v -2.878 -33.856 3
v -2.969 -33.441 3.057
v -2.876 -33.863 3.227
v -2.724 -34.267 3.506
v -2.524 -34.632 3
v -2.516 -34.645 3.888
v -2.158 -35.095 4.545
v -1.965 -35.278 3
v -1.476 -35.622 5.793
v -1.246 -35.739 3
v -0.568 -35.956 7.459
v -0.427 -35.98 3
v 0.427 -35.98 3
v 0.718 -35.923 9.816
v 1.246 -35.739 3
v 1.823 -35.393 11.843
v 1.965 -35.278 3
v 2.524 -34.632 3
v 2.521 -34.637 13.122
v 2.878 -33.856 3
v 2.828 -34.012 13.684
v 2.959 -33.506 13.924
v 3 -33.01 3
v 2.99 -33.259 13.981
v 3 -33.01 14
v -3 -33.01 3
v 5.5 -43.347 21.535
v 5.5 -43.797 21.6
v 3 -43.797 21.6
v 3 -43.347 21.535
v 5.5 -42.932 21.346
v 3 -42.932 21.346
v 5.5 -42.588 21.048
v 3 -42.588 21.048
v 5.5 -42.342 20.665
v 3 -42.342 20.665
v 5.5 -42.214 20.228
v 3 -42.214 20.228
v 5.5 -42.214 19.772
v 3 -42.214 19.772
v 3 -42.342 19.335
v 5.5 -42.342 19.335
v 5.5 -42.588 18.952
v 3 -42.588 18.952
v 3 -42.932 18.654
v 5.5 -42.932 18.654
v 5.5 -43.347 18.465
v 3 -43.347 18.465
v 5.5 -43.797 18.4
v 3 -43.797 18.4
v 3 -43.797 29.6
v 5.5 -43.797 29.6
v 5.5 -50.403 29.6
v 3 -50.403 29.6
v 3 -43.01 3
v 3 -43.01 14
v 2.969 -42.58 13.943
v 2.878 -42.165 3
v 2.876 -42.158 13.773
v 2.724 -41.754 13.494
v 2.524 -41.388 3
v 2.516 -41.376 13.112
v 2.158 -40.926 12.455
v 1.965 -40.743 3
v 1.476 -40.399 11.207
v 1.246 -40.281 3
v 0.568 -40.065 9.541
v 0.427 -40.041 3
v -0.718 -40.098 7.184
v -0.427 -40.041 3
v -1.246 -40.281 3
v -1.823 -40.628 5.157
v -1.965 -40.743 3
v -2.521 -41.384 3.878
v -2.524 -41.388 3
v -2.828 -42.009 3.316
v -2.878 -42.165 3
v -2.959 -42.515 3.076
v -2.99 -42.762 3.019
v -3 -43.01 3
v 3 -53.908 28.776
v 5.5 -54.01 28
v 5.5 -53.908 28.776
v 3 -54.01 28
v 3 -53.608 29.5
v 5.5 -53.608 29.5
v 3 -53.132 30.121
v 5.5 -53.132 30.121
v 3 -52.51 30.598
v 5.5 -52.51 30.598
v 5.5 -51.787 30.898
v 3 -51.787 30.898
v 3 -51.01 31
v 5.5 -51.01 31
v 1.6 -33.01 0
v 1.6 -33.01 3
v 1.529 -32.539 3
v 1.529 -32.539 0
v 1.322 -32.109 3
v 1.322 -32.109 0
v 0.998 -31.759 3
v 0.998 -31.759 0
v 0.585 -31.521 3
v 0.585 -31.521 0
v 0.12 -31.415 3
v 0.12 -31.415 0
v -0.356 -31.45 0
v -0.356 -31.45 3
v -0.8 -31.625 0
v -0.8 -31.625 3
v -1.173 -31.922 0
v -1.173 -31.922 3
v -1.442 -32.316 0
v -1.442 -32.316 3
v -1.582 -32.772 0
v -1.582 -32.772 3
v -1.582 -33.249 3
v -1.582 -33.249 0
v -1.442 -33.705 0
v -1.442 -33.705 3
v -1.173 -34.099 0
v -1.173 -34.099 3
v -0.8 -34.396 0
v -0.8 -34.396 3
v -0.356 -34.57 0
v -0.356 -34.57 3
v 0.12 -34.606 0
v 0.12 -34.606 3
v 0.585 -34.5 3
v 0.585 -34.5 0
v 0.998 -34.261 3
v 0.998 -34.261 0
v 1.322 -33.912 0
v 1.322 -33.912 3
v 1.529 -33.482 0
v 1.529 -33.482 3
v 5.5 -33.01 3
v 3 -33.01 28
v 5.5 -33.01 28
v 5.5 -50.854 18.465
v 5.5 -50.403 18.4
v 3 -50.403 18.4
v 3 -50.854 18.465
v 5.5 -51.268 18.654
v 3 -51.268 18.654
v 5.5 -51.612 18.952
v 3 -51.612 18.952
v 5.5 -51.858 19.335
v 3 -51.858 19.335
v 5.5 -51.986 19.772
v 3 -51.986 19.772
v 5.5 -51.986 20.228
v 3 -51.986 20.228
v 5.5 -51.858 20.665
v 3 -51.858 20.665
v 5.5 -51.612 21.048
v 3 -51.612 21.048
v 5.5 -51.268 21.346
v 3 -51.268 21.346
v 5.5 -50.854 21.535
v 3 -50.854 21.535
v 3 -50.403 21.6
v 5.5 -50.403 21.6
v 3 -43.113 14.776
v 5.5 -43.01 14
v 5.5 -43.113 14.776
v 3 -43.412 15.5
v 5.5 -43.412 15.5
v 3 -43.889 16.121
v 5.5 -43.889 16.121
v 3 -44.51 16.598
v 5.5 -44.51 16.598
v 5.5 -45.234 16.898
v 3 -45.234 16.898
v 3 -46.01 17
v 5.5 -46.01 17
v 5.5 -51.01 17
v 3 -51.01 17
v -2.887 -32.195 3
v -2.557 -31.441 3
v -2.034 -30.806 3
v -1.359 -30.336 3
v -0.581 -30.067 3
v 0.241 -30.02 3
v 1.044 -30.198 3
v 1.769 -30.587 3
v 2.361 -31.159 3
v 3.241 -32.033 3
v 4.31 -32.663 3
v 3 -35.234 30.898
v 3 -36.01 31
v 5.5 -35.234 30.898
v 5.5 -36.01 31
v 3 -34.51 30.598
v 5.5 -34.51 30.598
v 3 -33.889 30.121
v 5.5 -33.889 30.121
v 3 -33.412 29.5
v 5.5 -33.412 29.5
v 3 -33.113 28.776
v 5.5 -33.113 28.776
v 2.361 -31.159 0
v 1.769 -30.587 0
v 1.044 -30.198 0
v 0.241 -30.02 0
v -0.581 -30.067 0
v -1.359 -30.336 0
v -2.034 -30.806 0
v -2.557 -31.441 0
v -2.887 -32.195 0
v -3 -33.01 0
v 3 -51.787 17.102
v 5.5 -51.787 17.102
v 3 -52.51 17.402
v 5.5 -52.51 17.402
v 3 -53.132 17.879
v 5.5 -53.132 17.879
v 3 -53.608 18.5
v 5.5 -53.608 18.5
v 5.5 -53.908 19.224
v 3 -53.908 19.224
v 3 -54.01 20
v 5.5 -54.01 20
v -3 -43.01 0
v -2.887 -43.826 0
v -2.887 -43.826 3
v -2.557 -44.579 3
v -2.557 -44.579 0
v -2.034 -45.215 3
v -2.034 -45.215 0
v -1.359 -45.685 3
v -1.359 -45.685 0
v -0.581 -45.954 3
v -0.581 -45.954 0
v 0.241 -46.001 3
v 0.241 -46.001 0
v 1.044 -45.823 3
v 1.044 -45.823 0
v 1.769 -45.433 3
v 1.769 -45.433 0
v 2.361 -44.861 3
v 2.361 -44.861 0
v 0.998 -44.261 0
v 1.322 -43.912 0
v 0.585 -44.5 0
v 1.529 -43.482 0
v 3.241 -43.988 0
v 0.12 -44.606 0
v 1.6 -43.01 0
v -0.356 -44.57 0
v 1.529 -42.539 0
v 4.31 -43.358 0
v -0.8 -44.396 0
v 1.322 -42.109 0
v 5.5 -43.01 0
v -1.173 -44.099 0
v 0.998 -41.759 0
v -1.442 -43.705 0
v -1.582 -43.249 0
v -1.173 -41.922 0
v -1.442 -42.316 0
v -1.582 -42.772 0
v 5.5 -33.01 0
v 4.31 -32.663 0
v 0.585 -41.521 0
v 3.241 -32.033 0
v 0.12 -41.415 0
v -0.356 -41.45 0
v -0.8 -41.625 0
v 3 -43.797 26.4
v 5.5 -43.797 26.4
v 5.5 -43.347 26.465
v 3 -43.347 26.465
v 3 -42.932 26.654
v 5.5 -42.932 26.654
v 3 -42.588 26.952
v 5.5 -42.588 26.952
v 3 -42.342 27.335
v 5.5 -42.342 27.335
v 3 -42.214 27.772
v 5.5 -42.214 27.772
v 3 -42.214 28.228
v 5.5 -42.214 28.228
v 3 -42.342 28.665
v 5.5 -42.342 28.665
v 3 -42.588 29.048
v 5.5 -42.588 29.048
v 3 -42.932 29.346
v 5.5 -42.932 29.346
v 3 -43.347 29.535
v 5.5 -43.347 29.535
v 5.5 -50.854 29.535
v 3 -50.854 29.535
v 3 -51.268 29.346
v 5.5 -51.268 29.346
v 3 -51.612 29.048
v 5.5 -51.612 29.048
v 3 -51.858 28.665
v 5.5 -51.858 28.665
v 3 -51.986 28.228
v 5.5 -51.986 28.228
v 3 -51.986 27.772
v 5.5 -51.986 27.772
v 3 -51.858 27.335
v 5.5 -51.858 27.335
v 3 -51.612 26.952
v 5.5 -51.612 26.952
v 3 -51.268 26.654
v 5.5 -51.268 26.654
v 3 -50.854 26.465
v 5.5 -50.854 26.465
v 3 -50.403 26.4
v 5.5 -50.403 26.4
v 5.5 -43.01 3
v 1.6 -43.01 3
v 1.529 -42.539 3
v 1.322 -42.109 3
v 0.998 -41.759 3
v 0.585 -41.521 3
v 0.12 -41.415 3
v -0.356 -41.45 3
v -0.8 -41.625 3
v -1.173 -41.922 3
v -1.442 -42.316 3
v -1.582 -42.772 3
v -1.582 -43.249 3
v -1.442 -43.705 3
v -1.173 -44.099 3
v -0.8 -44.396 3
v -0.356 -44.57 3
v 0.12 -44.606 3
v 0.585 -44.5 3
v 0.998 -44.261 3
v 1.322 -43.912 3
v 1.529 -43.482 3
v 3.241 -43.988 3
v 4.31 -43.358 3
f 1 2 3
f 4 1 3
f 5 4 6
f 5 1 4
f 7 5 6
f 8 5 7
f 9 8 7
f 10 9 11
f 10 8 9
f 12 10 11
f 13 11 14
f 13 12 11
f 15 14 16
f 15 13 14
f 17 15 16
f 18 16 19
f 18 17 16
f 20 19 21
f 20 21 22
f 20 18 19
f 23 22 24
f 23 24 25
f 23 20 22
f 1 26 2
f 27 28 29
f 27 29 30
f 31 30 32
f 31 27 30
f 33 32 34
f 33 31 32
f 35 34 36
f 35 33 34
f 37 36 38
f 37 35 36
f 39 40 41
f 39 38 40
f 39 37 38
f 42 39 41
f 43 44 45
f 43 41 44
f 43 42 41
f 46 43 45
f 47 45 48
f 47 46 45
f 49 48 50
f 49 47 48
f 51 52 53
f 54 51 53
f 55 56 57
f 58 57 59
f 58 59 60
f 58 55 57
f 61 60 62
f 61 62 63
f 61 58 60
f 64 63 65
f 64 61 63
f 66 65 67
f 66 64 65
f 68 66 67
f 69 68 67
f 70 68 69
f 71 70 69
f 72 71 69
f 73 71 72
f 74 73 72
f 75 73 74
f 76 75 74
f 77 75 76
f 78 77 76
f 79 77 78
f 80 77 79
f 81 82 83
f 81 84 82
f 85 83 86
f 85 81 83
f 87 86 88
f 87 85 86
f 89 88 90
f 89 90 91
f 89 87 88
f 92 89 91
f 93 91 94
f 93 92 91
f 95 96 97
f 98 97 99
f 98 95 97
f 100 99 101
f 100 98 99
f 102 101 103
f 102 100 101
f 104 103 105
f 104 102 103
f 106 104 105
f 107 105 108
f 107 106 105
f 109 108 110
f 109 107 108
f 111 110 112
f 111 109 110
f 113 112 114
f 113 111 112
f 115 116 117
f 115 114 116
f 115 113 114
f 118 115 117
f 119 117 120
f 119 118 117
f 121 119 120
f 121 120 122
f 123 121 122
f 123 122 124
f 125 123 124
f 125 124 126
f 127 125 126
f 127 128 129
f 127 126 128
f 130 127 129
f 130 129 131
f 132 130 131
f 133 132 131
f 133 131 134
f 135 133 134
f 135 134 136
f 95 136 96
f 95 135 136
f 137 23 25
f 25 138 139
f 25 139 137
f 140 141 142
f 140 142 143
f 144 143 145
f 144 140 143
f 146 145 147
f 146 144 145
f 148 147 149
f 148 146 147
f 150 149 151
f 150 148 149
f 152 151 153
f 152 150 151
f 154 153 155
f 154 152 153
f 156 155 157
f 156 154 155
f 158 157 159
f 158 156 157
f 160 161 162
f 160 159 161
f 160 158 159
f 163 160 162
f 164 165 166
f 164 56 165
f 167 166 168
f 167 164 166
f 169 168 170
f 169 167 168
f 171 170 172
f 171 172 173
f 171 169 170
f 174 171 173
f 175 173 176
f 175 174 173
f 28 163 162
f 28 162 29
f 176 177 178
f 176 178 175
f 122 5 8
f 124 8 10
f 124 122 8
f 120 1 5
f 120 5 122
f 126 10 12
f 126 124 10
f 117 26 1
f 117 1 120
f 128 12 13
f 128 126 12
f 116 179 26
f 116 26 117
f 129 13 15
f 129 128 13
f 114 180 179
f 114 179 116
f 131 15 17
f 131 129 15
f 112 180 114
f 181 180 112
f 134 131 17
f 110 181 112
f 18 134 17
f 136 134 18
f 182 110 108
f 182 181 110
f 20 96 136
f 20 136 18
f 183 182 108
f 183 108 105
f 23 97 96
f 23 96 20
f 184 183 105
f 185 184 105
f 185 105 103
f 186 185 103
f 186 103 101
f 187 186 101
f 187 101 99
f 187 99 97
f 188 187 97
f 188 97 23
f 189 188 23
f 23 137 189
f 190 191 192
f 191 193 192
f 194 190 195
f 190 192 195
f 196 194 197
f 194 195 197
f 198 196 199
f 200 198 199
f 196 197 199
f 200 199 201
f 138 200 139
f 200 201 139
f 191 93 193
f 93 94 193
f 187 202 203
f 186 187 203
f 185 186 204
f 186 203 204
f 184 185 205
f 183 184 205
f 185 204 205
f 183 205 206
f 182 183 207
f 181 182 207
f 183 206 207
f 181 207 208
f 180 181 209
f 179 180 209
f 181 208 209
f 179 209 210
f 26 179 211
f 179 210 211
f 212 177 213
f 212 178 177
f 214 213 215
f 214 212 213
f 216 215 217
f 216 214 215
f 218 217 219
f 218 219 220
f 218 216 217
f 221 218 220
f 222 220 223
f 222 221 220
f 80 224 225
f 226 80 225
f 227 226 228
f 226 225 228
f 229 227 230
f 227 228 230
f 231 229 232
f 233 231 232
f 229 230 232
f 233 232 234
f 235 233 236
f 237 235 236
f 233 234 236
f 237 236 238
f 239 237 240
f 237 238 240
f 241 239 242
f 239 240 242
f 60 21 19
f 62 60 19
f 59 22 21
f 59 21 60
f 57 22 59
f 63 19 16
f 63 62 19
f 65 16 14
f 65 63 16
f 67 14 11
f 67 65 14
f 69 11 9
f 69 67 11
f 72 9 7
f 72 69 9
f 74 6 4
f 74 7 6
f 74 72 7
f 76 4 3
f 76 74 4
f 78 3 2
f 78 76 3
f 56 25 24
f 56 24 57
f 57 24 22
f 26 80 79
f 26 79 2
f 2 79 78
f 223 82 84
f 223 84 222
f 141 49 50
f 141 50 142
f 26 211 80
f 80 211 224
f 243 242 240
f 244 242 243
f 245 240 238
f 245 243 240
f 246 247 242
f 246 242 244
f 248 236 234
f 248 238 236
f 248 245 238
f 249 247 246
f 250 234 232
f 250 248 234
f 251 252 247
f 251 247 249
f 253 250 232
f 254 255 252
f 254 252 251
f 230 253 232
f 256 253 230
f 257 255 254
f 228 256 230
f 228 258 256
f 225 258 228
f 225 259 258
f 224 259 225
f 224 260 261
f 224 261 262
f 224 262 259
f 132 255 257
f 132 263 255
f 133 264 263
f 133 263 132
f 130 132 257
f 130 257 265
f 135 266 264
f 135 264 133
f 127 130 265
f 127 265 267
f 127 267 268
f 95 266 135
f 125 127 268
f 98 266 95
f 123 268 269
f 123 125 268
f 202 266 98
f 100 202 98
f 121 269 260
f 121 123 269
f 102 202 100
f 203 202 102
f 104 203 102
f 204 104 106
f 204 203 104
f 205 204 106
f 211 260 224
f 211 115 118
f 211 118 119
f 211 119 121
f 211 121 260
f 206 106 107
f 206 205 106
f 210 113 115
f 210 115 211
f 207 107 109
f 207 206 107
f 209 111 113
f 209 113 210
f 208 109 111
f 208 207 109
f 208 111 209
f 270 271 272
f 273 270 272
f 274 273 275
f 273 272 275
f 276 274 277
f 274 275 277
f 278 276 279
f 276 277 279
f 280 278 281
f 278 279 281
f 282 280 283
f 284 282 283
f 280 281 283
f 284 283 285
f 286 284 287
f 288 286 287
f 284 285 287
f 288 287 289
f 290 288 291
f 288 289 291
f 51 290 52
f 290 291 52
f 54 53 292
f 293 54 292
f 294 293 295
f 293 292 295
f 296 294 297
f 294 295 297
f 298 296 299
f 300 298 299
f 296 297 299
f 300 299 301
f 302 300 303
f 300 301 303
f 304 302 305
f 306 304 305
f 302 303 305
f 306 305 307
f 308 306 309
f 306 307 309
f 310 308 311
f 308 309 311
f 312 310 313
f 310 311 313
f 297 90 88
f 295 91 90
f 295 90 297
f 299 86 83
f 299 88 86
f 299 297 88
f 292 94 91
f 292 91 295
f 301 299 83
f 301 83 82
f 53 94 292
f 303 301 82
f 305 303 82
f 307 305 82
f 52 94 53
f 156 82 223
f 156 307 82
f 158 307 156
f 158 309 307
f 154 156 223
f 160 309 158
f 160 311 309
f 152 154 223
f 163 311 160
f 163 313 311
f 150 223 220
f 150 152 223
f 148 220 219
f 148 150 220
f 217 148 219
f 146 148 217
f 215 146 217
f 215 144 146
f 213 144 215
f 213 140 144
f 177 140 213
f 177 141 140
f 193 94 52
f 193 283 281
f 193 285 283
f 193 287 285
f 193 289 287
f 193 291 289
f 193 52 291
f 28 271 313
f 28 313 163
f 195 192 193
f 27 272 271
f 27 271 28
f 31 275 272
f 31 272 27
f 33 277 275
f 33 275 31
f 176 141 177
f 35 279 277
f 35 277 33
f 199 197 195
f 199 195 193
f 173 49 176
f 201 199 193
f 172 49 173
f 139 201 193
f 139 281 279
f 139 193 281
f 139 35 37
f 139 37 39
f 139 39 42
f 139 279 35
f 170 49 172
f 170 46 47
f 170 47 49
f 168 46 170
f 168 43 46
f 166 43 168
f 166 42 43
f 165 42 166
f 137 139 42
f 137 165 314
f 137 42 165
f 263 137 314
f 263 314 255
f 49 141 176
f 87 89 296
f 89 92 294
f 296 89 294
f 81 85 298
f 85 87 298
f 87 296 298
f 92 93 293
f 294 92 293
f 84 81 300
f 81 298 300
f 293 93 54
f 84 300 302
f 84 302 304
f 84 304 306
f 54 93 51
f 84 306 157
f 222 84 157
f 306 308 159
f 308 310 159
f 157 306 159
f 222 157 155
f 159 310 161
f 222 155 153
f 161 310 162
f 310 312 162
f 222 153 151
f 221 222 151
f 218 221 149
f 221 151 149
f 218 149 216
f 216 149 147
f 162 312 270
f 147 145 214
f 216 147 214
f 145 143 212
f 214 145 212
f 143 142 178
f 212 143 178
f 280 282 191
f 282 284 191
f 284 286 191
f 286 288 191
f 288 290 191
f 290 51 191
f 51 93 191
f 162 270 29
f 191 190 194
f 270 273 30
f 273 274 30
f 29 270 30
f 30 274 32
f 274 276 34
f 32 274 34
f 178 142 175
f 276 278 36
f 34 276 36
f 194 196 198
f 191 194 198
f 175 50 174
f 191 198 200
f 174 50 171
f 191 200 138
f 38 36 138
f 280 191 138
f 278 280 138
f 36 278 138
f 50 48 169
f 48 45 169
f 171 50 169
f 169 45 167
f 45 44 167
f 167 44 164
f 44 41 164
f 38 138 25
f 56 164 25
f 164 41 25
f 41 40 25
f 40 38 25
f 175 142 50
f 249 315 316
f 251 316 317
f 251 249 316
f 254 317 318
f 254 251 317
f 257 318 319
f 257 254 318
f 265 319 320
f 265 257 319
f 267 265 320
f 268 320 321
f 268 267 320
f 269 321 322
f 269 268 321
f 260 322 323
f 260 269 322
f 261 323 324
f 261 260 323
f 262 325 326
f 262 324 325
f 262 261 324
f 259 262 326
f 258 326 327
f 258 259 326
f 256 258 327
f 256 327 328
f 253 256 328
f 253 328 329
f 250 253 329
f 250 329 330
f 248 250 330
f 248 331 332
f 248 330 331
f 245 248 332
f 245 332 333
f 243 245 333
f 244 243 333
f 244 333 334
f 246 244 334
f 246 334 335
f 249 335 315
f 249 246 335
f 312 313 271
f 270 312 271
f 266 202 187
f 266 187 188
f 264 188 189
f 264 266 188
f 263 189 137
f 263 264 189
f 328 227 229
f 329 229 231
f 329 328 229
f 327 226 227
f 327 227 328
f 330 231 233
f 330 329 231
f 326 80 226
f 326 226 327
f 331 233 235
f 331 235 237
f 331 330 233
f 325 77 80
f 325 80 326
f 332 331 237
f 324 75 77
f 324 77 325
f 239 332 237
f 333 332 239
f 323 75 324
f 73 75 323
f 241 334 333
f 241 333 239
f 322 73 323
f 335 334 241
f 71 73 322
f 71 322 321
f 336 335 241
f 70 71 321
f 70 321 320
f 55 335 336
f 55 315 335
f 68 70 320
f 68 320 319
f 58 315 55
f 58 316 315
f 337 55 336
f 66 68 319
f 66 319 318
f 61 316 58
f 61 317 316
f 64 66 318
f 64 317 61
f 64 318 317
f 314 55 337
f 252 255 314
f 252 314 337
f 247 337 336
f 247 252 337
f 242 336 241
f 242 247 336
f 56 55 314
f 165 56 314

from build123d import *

# Parameters (mm, degrees)
SKETCH_1_R          = 1.6
EXTRUDE_1_DEPTH     = 3
SKETCH_3_W          = 2.5
SKETCH_3_H          = 10
EXTRUDE_2_DEPTH     = 28
FILLET_1_R          = 5
FILLET_2_R          = 5
SKETCH_4_W          = 14
SKETCH_4_H          = 11
EXTRUDE_3_DEPTH     = 2.5
CUT_EXTRUDE_1_DEPTH = 63.851944341
EXTRUDE_4_DEPTH     = 10
SKETCH_8_R          = 3
CUT_EXTRUDE_2_DEPTH = 62.084915548
FILLET_3_R          = 3


with BuildPart() as part:
    # 草图1 → 凸台-拉伸1 (new body)
    with BuildSketch(Plane.XY):
        with BuildLine():
            ThreePointArc((3, -33.010340746), (0, -30.010340746), (-3, -33.010340746))
            Line((-3, -33.010340746), (-3, -43.010340746))
            ThreePointArc((-3, -43.010340746), (0, -46.010340746), (3, -43.010340746))
            Line((3, -43.010340746), (5.5, -43.010340746))
            Line((5.5, -43.010340746), (5.5, -33.010340746))
            Line((5.5, -33.010340746), (3, -33.010340746))
        make_face()
        with Locations((0, -33.010340746)):
            Circle(SKETCH_1_R, mode=Mode.SUBTRACT)
        with Locations((0, -43.010340746)):
            Circle(SKETCH_1_R, mode=Mode.SUBTRACT)
    extrude(amount=EXTRUDE_1_DEPTH)

    # 草图3 → 凸台-拉伸2 (add)
    with BuildSketch(Plane.XY.offset(3)):
        with Locations((4.25, -38.010340746)):
            Rectangle(SKETCH_3_W, SKETCH_3_H)
    extrude(amount=EXTRUDE_2_DEPTH)

    # 圆角1
    # the kernel refuses this fillet: 5 mm, written as the material it adds along each edge
    with BuildSketch(Plane(origin=(3, -43.010340746, 0), x_dir=(-0.32639560491693326, -0.9452332564456825, 0), z_dir=(0, 0, 1))) as fillet_1_piece_1:
        with BuildLine():
            CenterArc((3.590351654, 4.726166282), FILLET_1_R, 208.20428203, 42.745569225)
            Line((-0.815989012, 2.363083141), (0, 0))
            ThreePointArc((0, 0), (0.979186815, 0.164300231), (1.95837363, 0))
        make_face()
    extrude(amount=3)

    # 圆角2
    # the kernel refuses this fillet: 5 mm, written as the material it adds along each edge
    with BuildSketch(Plane(origin=(3, -33.010340746, 0), x_dir=(1, 0, 0), z_dir=(0, 0, 1))) as fillet_2_piece_1:
        with BuildLine():
            CenterArc((3.295454545, 4.936319688), FILLET_2_R, 218.100297491, 42.745569225)
            ThreePointArc((-0.639204545, 1.851119883), (-0.164300231, 0.979186815), (0, 0))
            Line((0, 0), (2.5, 0))
        make_face()
    extrude(amount=3)

    # 草图4 → 凸台-拉伸3 (add)
    with BuildSketch(Plane(origin=(5.5, 0, 0), x_dir=(0, 0, -1), z_dir=(1, 0, 0))):
        with Locations((-24, -48.510340746)):
            Rectangle(SKETCH_4_W, SKETCH_4_H)
    extrude(amount=-EXTRUDE_3_DEPTH)

    # 草图5 → 切除-拉伸1 (cut, through all)
    with BuildSketch(Plane(origin=(5.5, 0, 0), x_dir=(0, 0, -1), z_dir=(1, 0, 0))):
        with BuildLine():
            Line((-26.4, -50.402762968), (-26.4, -43.797439087))
            ThreePointArc((-26.4, -43.797439087), (-28, -42.197439087), (-29.6, -43.797439087))
            Line((-29.6, -43.797439087), (-29.6, -50.402762968))
            ThreePointArc((-29.6, -50.402762968), (-28, -52.002762968), (-26.4, -50.402762968))
        make_face()
        with BuildLine():
            Line((-21.6, -50.402762968), (-21.6, -43.797439087))
            ThreePointArc((-21.6, -43.797439087), (-20, -42.197439087), (-18.4, -43.797439087))
            Line((-18.4, -43.797439087), (-18.4, -50.402762968))
            ThreePointArc((-18.4, -50.402762968), (-20, -52.002762968), (-21.6, -50.402762968))
        make_face()
    extrude(amount=-CUT_EXTRUDE_1_DEPTH, mode=Mode.SUBTRACT)

    # 草图6 → 凸台-拉伸4 (add)
    with BuildSketch(Plane.XZ.offset(43.010340746)):
        Polygon((3, 14), (-3, 3), (3, 3), align=None)
    extrude(amount=-EXTRUDE_4_DEPTH)

    # 草图8 → 切除-拉伸2 (cut, through all)
    with BuildSketch(Plane.XY.offset(3)):
        with Locations((0, -43.010340746)):
            Circle(SKETCH_8_R)
        with Locations((0, -33.010340746)):
            Circle(SKETCH_8_R)
    extrude(amount=CUT_EXTRUDE_2_DEPTH, mode=Mode.SUBTRACT)

    # 圆角3
    fillet_3_edges = [part.edges().sort_by_distance(p)[0] for p in [
        (4.25, -43.010340746, 17),
        (4.25, -54.010340746, 17),
        (4.25, -54.010340746, 31),
        (4.25, -33.010340746, 31),
    ]]
    fillet(fillet_3_edges, radius=FILLET_3_R)


solid = part.part
